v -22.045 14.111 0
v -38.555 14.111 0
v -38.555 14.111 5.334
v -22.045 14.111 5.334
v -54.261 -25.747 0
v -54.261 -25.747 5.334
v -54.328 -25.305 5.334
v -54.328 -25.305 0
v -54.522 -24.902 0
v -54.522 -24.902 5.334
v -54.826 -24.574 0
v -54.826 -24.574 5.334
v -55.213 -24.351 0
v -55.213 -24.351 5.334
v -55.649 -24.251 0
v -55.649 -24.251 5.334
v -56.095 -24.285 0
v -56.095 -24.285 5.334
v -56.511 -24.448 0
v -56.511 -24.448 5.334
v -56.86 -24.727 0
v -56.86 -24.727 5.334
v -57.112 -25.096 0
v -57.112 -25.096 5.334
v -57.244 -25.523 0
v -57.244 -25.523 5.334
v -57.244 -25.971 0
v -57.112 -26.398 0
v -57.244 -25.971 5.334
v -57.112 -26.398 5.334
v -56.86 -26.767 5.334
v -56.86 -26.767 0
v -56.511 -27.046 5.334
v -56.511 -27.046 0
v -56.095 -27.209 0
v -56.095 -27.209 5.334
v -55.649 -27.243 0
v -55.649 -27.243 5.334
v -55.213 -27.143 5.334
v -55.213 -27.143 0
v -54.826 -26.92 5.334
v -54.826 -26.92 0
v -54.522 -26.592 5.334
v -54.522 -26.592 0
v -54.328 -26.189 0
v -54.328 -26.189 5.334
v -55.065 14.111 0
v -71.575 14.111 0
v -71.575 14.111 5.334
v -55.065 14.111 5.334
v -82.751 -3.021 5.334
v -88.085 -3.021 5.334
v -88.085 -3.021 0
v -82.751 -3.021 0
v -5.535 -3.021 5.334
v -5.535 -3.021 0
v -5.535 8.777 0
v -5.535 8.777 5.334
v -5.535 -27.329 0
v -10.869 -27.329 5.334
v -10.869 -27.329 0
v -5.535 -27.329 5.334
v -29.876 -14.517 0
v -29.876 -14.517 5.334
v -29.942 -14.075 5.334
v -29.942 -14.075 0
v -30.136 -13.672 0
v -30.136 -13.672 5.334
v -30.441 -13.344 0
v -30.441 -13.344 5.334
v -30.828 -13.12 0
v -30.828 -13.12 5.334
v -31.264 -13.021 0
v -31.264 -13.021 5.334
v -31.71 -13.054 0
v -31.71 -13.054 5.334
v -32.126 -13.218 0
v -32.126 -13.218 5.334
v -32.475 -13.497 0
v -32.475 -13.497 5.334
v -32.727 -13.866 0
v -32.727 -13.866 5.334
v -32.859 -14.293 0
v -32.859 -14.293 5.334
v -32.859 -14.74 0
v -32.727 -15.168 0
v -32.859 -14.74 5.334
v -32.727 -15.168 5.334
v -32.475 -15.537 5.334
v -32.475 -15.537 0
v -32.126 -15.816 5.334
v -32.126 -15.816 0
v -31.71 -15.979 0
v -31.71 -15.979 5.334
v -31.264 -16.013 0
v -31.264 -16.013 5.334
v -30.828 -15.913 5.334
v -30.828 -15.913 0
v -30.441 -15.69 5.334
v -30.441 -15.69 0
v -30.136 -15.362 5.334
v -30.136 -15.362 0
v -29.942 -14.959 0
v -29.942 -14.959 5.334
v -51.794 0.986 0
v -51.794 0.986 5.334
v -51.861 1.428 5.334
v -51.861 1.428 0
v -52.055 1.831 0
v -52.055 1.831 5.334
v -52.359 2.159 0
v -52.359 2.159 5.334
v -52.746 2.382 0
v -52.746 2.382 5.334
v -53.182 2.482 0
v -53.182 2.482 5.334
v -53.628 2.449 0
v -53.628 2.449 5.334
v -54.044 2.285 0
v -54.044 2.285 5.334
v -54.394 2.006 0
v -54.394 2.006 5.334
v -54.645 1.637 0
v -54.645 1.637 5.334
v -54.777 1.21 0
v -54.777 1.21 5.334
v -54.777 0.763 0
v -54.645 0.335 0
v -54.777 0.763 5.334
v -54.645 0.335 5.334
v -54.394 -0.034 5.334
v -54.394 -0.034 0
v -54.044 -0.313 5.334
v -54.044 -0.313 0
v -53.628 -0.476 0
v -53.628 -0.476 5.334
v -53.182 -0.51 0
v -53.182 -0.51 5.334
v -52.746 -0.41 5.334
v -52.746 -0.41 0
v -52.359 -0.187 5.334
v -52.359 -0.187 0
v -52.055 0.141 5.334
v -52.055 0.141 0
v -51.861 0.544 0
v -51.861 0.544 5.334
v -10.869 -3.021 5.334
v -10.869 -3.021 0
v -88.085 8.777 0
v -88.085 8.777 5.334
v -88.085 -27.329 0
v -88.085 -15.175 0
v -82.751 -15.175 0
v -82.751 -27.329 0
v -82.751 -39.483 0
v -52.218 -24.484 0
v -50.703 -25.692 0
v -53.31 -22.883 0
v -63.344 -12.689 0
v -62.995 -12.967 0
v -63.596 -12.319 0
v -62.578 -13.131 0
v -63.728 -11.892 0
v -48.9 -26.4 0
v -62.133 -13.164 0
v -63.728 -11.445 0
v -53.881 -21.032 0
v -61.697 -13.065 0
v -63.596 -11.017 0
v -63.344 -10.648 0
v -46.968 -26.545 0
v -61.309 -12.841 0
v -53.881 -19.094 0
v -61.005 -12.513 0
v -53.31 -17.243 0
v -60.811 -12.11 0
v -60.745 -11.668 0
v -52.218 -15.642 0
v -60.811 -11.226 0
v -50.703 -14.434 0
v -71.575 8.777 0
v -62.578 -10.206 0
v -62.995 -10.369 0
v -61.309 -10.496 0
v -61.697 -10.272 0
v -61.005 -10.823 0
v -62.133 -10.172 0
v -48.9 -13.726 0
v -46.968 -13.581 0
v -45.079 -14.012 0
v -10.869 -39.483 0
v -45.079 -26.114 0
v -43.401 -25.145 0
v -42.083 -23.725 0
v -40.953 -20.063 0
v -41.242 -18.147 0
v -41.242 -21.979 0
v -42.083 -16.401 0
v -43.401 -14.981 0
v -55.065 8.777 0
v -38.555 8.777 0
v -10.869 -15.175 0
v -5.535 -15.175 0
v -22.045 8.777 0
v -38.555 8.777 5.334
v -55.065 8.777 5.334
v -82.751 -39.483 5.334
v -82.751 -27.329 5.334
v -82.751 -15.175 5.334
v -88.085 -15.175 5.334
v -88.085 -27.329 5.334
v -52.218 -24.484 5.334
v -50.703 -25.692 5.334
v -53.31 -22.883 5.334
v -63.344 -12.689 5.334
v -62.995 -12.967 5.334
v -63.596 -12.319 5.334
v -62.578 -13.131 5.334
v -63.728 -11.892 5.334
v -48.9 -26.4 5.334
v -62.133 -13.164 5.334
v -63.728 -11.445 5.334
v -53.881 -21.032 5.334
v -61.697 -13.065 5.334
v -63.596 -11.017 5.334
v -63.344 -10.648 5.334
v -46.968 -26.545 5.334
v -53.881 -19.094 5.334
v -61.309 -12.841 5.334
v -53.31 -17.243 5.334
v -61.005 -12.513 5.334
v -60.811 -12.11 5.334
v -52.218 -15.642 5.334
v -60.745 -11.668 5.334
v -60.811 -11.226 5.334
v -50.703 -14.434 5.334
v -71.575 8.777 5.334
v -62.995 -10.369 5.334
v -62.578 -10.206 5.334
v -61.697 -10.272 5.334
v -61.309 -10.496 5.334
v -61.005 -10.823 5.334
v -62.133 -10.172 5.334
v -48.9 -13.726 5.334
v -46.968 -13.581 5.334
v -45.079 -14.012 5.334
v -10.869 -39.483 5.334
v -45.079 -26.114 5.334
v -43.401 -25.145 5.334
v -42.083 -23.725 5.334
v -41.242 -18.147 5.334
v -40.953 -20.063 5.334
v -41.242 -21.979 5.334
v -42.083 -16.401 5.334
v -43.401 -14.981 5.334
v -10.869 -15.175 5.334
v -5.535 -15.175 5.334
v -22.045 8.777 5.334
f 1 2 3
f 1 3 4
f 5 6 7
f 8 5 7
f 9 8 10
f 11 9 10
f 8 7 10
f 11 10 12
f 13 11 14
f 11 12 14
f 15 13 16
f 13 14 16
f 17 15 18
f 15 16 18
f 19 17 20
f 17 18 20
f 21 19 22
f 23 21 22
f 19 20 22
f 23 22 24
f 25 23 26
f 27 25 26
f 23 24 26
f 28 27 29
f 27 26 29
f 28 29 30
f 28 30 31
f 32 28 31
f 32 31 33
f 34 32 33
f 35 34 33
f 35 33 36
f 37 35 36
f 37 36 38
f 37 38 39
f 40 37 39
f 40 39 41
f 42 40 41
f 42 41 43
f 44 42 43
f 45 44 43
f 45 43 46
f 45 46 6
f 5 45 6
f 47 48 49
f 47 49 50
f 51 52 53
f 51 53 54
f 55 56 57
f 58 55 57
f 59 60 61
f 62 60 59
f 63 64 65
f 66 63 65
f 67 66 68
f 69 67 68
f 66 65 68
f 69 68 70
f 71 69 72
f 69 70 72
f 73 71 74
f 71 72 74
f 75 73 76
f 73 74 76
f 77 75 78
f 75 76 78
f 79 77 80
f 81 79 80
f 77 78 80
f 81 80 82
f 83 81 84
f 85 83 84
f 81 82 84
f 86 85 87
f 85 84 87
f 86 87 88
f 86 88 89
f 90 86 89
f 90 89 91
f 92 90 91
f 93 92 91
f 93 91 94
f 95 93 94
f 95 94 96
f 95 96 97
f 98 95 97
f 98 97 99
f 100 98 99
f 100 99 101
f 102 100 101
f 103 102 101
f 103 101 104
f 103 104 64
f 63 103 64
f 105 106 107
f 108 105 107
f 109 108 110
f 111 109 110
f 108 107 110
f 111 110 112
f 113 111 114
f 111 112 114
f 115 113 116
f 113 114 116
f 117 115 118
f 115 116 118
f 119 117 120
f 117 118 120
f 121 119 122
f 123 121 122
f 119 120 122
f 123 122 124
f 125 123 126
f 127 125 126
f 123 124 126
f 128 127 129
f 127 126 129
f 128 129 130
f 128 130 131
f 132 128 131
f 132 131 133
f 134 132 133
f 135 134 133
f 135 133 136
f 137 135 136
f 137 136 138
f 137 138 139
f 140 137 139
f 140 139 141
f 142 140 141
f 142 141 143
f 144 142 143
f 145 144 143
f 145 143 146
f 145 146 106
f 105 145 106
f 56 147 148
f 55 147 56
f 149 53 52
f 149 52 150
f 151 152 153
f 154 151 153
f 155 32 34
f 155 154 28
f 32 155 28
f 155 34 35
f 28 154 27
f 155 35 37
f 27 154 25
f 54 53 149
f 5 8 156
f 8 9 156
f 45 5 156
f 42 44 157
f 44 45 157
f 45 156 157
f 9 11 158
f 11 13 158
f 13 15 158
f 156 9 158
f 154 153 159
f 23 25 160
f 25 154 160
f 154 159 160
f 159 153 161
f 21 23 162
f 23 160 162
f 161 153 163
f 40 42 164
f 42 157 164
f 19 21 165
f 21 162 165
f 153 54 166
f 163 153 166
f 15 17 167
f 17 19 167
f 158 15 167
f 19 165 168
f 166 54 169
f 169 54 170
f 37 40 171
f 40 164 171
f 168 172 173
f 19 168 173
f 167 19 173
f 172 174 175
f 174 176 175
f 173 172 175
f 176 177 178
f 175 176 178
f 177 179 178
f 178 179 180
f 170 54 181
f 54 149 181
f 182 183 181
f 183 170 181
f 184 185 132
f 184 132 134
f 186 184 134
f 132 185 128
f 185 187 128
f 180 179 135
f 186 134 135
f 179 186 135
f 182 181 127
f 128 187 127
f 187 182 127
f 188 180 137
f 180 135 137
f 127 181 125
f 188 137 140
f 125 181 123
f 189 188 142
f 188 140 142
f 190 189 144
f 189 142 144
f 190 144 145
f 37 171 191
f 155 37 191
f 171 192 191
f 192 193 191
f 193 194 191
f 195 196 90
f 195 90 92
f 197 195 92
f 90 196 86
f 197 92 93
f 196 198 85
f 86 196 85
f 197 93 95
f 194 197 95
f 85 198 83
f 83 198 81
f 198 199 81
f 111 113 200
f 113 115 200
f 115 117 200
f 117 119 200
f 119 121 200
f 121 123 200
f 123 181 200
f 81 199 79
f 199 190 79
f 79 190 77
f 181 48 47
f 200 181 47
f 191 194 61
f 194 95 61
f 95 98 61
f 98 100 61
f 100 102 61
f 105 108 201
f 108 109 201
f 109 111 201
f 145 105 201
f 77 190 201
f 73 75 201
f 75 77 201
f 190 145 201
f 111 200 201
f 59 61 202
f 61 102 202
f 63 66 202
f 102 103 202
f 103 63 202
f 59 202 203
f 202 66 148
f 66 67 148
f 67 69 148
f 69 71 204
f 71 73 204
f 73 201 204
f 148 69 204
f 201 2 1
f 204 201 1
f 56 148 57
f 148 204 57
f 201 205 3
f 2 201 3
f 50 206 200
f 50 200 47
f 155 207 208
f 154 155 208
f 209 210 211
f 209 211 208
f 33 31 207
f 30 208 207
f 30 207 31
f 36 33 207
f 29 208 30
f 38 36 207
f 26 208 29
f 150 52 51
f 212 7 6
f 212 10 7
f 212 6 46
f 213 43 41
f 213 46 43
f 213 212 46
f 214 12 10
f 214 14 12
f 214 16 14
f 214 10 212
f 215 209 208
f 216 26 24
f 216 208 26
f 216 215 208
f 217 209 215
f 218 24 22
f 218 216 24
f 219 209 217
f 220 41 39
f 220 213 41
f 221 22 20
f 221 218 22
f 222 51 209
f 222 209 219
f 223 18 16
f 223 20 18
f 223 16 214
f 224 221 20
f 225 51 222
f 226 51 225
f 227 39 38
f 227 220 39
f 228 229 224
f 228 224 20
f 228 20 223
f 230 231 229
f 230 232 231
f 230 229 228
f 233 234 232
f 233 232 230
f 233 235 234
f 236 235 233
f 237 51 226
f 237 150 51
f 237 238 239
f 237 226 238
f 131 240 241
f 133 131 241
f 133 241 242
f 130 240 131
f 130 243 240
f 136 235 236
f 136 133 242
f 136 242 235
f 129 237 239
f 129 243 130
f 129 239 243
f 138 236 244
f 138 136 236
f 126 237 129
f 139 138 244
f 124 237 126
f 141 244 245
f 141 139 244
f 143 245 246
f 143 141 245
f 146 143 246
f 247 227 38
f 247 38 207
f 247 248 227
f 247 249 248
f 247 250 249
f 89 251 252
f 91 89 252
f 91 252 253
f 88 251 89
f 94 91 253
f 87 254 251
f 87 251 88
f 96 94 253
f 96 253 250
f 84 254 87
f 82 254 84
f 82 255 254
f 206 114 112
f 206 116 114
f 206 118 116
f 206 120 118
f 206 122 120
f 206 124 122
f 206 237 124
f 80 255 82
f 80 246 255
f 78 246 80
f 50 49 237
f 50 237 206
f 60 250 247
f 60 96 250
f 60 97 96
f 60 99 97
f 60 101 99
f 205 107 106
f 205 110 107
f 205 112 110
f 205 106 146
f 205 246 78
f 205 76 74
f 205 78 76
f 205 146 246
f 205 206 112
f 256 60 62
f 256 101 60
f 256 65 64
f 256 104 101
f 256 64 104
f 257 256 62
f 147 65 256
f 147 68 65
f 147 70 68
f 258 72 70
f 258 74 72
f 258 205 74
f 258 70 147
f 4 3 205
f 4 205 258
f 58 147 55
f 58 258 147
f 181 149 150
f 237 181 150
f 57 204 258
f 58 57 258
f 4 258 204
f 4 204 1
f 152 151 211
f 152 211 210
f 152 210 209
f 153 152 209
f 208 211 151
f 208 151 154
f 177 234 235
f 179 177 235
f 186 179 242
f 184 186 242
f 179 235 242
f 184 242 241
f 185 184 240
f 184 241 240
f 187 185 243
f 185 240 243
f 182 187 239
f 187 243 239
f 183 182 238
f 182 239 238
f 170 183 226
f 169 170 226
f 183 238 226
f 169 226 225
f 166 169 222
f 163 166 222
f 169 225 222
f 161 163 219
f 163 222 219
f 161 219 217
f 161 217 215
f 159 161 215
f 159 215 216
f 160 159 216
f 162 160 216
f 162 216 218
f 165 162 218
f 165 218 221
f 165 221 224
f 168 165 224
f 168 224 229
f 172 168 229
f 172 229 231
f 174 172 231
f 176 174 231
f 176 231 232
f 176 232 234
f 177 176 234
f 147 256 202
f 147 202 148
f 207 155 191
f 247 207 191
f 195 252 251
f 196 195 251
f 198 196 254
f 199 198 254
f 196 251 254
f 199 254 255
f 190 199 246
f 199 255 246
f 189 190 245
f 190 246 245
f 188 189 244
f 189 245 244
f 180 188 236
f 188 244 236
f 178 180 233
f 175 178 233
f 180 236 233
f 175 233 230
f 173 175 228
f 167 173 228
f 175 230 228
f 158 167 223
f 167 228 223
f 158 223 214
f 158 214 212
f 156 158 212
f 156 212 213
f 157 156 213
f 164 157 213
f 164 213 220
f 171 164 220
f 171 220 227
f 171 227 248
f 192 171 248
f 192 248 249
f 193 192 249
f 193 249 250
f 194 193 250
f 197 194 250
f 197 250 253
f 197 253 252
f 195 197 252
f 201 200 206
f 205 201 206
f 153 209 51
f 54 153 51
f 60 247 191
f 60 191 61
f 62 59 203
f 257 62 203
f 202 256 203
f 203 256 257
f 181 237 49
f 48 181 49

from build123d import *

# Parameters (mm, degrees)
SKETCH1_W                = 82.55
SKETCH1_H                = 53.594
BOSS_EXTRUDE1_DEPTH      = 5.334
CUT_EXTRUDE1_START       = -88.085249325
CUT_EXTRUDE1_OUTLINE_W   = 5.334
CUT_EXTRUDE1_OUTLINE_H   = 5.334
CUT_EXTRUDE1_DEPTH       = 16.51
CUT_EXTRUDE1_START_2     = -55.065249325
CUT_EXTRUDE1_2_OUTLINE_W = 5.334
CUT_EXTRUDE1_2_OUTLINE_H = 5.334
CUT_EXTRUDE1_2_DEPTH     = 16.51
CUT_EXTRUDE1_START_3     = -22.045249325
CUT_EXTRUDE1_3_OUTLINE_W = 5.334
CUT_EXTRUDE1_3_OUTLINE_H = 5.334
CUT_EXTRUDE1_3_DEPTH     = 16.51
SKETCH3_W                = 5.334
SKETCH3_H                = 12.154056038
CUT_EXTRUDE2_DEPTH       = 97.676684204
SKETCH5_R                = 1.5
SKETCH5_R_2              = 6.5
CUT_EXTRUDE4_DEPTH       = 97.676684204


# Read off the part's stored shape, not the designer's step: Cut-Extrude1
with BuildPart() as part:
    # Sketch1 → Boss-Extrude1 (new body)
    with BuildSketch(Plane.XY):
        with Locations((-46.810249325, -12.686142782)):
            Rectangle(SKETCH1_W, SKETCH1_H)
    extrude(amount=BOSS_EXTRUDE1_DEPTH)

    # Cut-Extrude1 outline → Cut-Extrude1 (cut)
    with BuildSketch(Plane.YZ.offset(CUT_EXTRUDE1_START)):
        with Locations((11.443857218, 2.667)):
            Rectangle(CUT_EXTRUDE1_OUTLINE_W, CUT_EXTRUDE1_OUTLINE_H)
    extrude(amount=CUT_EXTRUDE1_DEPTH, mode=Mode.SUBTRACT)

    # Cut-Extrude1 2 outline → Cut-Extrude1 2 (cut)
    with BuildSketch(Plane.YZ.offset(CUT_EXTRUDE1_START_2)):
        with Locations((11.443857218, 2.667)):
            Rectangle(CUT_EXTRUDE1_2_OUTLINE_W, CUT_EXTRUDE1_2_OUTLINE_H)
    extrude(amount=CUT_EXTRUDE1_2_DEPTH, mode=Mode.SUBTRACT)

    # Cut-Extrude1 3 outline → Cut-Extrude1 3 (cut)
    with BuildSketch(Plane.YZ.offset(CUT_EXTRUDE1_START_3)):
        with Locations((11.443857218, 2.667)):
            Rectangle(CUT_EXTRUDE1_3_OUTLINE_W, CUT_EXTRUDE1_3_OUTLINE_H)
    extrude(amount=CUT_EXTRUDE1_3_DEPTH, mode=Mode.SUBTRACT)

    # Sketch3 → Cut-Extrude2 (cut, through all)
    with BuildSketch(Plane.XY.offset(5.334)):
        with Locations((-85.418249325, -33.406114763)):
            Rectangle(SKETCH3_W, SKETCH3_H)
        with Locations((-85.418249325, -9.098002686)):
            Rectangle(SKETCH3_W, SKETCH3_H)
        with Locations((-8.202249325, -33.406114763)):
            Rectangle(SKETCH3_W, SKETCH3_H)
        with Locations((-8.202249325, -9.098002686)):
            Rectangle(SKETCH3_W, SKETCH3_H)
    extrude(amount=-CUT_EXTRUDE2_DEPTH, mode=Mode.SUBTRACT)

    # Sketch5 → Cut-Extrude4 (cut, through all)
    with BuildSketch(Plane.XY.offset(5.334)):
        with Locations((-62.244676311, -11.668301366)):
            Circle(SKETCH5_R)
        with Locations((-55.760892065, -25.747027937)):
            Circle(SKETCH5_R)
        with Locations((-53.29403357, 0.986183789)):
            Circle(SKETCH5_R)
        with Locations((-31.375822338, -14.516784198)):
            Circle(SKETCH5_R)
        with Locations((-47.453455125, -20.062929163)):
            Circle(SKETCH5_R_2)
    extrude(amount=-CUT_EXTRUDE4_DEPTH, mode=Mode.SUBTRACT)


solid = part.part
